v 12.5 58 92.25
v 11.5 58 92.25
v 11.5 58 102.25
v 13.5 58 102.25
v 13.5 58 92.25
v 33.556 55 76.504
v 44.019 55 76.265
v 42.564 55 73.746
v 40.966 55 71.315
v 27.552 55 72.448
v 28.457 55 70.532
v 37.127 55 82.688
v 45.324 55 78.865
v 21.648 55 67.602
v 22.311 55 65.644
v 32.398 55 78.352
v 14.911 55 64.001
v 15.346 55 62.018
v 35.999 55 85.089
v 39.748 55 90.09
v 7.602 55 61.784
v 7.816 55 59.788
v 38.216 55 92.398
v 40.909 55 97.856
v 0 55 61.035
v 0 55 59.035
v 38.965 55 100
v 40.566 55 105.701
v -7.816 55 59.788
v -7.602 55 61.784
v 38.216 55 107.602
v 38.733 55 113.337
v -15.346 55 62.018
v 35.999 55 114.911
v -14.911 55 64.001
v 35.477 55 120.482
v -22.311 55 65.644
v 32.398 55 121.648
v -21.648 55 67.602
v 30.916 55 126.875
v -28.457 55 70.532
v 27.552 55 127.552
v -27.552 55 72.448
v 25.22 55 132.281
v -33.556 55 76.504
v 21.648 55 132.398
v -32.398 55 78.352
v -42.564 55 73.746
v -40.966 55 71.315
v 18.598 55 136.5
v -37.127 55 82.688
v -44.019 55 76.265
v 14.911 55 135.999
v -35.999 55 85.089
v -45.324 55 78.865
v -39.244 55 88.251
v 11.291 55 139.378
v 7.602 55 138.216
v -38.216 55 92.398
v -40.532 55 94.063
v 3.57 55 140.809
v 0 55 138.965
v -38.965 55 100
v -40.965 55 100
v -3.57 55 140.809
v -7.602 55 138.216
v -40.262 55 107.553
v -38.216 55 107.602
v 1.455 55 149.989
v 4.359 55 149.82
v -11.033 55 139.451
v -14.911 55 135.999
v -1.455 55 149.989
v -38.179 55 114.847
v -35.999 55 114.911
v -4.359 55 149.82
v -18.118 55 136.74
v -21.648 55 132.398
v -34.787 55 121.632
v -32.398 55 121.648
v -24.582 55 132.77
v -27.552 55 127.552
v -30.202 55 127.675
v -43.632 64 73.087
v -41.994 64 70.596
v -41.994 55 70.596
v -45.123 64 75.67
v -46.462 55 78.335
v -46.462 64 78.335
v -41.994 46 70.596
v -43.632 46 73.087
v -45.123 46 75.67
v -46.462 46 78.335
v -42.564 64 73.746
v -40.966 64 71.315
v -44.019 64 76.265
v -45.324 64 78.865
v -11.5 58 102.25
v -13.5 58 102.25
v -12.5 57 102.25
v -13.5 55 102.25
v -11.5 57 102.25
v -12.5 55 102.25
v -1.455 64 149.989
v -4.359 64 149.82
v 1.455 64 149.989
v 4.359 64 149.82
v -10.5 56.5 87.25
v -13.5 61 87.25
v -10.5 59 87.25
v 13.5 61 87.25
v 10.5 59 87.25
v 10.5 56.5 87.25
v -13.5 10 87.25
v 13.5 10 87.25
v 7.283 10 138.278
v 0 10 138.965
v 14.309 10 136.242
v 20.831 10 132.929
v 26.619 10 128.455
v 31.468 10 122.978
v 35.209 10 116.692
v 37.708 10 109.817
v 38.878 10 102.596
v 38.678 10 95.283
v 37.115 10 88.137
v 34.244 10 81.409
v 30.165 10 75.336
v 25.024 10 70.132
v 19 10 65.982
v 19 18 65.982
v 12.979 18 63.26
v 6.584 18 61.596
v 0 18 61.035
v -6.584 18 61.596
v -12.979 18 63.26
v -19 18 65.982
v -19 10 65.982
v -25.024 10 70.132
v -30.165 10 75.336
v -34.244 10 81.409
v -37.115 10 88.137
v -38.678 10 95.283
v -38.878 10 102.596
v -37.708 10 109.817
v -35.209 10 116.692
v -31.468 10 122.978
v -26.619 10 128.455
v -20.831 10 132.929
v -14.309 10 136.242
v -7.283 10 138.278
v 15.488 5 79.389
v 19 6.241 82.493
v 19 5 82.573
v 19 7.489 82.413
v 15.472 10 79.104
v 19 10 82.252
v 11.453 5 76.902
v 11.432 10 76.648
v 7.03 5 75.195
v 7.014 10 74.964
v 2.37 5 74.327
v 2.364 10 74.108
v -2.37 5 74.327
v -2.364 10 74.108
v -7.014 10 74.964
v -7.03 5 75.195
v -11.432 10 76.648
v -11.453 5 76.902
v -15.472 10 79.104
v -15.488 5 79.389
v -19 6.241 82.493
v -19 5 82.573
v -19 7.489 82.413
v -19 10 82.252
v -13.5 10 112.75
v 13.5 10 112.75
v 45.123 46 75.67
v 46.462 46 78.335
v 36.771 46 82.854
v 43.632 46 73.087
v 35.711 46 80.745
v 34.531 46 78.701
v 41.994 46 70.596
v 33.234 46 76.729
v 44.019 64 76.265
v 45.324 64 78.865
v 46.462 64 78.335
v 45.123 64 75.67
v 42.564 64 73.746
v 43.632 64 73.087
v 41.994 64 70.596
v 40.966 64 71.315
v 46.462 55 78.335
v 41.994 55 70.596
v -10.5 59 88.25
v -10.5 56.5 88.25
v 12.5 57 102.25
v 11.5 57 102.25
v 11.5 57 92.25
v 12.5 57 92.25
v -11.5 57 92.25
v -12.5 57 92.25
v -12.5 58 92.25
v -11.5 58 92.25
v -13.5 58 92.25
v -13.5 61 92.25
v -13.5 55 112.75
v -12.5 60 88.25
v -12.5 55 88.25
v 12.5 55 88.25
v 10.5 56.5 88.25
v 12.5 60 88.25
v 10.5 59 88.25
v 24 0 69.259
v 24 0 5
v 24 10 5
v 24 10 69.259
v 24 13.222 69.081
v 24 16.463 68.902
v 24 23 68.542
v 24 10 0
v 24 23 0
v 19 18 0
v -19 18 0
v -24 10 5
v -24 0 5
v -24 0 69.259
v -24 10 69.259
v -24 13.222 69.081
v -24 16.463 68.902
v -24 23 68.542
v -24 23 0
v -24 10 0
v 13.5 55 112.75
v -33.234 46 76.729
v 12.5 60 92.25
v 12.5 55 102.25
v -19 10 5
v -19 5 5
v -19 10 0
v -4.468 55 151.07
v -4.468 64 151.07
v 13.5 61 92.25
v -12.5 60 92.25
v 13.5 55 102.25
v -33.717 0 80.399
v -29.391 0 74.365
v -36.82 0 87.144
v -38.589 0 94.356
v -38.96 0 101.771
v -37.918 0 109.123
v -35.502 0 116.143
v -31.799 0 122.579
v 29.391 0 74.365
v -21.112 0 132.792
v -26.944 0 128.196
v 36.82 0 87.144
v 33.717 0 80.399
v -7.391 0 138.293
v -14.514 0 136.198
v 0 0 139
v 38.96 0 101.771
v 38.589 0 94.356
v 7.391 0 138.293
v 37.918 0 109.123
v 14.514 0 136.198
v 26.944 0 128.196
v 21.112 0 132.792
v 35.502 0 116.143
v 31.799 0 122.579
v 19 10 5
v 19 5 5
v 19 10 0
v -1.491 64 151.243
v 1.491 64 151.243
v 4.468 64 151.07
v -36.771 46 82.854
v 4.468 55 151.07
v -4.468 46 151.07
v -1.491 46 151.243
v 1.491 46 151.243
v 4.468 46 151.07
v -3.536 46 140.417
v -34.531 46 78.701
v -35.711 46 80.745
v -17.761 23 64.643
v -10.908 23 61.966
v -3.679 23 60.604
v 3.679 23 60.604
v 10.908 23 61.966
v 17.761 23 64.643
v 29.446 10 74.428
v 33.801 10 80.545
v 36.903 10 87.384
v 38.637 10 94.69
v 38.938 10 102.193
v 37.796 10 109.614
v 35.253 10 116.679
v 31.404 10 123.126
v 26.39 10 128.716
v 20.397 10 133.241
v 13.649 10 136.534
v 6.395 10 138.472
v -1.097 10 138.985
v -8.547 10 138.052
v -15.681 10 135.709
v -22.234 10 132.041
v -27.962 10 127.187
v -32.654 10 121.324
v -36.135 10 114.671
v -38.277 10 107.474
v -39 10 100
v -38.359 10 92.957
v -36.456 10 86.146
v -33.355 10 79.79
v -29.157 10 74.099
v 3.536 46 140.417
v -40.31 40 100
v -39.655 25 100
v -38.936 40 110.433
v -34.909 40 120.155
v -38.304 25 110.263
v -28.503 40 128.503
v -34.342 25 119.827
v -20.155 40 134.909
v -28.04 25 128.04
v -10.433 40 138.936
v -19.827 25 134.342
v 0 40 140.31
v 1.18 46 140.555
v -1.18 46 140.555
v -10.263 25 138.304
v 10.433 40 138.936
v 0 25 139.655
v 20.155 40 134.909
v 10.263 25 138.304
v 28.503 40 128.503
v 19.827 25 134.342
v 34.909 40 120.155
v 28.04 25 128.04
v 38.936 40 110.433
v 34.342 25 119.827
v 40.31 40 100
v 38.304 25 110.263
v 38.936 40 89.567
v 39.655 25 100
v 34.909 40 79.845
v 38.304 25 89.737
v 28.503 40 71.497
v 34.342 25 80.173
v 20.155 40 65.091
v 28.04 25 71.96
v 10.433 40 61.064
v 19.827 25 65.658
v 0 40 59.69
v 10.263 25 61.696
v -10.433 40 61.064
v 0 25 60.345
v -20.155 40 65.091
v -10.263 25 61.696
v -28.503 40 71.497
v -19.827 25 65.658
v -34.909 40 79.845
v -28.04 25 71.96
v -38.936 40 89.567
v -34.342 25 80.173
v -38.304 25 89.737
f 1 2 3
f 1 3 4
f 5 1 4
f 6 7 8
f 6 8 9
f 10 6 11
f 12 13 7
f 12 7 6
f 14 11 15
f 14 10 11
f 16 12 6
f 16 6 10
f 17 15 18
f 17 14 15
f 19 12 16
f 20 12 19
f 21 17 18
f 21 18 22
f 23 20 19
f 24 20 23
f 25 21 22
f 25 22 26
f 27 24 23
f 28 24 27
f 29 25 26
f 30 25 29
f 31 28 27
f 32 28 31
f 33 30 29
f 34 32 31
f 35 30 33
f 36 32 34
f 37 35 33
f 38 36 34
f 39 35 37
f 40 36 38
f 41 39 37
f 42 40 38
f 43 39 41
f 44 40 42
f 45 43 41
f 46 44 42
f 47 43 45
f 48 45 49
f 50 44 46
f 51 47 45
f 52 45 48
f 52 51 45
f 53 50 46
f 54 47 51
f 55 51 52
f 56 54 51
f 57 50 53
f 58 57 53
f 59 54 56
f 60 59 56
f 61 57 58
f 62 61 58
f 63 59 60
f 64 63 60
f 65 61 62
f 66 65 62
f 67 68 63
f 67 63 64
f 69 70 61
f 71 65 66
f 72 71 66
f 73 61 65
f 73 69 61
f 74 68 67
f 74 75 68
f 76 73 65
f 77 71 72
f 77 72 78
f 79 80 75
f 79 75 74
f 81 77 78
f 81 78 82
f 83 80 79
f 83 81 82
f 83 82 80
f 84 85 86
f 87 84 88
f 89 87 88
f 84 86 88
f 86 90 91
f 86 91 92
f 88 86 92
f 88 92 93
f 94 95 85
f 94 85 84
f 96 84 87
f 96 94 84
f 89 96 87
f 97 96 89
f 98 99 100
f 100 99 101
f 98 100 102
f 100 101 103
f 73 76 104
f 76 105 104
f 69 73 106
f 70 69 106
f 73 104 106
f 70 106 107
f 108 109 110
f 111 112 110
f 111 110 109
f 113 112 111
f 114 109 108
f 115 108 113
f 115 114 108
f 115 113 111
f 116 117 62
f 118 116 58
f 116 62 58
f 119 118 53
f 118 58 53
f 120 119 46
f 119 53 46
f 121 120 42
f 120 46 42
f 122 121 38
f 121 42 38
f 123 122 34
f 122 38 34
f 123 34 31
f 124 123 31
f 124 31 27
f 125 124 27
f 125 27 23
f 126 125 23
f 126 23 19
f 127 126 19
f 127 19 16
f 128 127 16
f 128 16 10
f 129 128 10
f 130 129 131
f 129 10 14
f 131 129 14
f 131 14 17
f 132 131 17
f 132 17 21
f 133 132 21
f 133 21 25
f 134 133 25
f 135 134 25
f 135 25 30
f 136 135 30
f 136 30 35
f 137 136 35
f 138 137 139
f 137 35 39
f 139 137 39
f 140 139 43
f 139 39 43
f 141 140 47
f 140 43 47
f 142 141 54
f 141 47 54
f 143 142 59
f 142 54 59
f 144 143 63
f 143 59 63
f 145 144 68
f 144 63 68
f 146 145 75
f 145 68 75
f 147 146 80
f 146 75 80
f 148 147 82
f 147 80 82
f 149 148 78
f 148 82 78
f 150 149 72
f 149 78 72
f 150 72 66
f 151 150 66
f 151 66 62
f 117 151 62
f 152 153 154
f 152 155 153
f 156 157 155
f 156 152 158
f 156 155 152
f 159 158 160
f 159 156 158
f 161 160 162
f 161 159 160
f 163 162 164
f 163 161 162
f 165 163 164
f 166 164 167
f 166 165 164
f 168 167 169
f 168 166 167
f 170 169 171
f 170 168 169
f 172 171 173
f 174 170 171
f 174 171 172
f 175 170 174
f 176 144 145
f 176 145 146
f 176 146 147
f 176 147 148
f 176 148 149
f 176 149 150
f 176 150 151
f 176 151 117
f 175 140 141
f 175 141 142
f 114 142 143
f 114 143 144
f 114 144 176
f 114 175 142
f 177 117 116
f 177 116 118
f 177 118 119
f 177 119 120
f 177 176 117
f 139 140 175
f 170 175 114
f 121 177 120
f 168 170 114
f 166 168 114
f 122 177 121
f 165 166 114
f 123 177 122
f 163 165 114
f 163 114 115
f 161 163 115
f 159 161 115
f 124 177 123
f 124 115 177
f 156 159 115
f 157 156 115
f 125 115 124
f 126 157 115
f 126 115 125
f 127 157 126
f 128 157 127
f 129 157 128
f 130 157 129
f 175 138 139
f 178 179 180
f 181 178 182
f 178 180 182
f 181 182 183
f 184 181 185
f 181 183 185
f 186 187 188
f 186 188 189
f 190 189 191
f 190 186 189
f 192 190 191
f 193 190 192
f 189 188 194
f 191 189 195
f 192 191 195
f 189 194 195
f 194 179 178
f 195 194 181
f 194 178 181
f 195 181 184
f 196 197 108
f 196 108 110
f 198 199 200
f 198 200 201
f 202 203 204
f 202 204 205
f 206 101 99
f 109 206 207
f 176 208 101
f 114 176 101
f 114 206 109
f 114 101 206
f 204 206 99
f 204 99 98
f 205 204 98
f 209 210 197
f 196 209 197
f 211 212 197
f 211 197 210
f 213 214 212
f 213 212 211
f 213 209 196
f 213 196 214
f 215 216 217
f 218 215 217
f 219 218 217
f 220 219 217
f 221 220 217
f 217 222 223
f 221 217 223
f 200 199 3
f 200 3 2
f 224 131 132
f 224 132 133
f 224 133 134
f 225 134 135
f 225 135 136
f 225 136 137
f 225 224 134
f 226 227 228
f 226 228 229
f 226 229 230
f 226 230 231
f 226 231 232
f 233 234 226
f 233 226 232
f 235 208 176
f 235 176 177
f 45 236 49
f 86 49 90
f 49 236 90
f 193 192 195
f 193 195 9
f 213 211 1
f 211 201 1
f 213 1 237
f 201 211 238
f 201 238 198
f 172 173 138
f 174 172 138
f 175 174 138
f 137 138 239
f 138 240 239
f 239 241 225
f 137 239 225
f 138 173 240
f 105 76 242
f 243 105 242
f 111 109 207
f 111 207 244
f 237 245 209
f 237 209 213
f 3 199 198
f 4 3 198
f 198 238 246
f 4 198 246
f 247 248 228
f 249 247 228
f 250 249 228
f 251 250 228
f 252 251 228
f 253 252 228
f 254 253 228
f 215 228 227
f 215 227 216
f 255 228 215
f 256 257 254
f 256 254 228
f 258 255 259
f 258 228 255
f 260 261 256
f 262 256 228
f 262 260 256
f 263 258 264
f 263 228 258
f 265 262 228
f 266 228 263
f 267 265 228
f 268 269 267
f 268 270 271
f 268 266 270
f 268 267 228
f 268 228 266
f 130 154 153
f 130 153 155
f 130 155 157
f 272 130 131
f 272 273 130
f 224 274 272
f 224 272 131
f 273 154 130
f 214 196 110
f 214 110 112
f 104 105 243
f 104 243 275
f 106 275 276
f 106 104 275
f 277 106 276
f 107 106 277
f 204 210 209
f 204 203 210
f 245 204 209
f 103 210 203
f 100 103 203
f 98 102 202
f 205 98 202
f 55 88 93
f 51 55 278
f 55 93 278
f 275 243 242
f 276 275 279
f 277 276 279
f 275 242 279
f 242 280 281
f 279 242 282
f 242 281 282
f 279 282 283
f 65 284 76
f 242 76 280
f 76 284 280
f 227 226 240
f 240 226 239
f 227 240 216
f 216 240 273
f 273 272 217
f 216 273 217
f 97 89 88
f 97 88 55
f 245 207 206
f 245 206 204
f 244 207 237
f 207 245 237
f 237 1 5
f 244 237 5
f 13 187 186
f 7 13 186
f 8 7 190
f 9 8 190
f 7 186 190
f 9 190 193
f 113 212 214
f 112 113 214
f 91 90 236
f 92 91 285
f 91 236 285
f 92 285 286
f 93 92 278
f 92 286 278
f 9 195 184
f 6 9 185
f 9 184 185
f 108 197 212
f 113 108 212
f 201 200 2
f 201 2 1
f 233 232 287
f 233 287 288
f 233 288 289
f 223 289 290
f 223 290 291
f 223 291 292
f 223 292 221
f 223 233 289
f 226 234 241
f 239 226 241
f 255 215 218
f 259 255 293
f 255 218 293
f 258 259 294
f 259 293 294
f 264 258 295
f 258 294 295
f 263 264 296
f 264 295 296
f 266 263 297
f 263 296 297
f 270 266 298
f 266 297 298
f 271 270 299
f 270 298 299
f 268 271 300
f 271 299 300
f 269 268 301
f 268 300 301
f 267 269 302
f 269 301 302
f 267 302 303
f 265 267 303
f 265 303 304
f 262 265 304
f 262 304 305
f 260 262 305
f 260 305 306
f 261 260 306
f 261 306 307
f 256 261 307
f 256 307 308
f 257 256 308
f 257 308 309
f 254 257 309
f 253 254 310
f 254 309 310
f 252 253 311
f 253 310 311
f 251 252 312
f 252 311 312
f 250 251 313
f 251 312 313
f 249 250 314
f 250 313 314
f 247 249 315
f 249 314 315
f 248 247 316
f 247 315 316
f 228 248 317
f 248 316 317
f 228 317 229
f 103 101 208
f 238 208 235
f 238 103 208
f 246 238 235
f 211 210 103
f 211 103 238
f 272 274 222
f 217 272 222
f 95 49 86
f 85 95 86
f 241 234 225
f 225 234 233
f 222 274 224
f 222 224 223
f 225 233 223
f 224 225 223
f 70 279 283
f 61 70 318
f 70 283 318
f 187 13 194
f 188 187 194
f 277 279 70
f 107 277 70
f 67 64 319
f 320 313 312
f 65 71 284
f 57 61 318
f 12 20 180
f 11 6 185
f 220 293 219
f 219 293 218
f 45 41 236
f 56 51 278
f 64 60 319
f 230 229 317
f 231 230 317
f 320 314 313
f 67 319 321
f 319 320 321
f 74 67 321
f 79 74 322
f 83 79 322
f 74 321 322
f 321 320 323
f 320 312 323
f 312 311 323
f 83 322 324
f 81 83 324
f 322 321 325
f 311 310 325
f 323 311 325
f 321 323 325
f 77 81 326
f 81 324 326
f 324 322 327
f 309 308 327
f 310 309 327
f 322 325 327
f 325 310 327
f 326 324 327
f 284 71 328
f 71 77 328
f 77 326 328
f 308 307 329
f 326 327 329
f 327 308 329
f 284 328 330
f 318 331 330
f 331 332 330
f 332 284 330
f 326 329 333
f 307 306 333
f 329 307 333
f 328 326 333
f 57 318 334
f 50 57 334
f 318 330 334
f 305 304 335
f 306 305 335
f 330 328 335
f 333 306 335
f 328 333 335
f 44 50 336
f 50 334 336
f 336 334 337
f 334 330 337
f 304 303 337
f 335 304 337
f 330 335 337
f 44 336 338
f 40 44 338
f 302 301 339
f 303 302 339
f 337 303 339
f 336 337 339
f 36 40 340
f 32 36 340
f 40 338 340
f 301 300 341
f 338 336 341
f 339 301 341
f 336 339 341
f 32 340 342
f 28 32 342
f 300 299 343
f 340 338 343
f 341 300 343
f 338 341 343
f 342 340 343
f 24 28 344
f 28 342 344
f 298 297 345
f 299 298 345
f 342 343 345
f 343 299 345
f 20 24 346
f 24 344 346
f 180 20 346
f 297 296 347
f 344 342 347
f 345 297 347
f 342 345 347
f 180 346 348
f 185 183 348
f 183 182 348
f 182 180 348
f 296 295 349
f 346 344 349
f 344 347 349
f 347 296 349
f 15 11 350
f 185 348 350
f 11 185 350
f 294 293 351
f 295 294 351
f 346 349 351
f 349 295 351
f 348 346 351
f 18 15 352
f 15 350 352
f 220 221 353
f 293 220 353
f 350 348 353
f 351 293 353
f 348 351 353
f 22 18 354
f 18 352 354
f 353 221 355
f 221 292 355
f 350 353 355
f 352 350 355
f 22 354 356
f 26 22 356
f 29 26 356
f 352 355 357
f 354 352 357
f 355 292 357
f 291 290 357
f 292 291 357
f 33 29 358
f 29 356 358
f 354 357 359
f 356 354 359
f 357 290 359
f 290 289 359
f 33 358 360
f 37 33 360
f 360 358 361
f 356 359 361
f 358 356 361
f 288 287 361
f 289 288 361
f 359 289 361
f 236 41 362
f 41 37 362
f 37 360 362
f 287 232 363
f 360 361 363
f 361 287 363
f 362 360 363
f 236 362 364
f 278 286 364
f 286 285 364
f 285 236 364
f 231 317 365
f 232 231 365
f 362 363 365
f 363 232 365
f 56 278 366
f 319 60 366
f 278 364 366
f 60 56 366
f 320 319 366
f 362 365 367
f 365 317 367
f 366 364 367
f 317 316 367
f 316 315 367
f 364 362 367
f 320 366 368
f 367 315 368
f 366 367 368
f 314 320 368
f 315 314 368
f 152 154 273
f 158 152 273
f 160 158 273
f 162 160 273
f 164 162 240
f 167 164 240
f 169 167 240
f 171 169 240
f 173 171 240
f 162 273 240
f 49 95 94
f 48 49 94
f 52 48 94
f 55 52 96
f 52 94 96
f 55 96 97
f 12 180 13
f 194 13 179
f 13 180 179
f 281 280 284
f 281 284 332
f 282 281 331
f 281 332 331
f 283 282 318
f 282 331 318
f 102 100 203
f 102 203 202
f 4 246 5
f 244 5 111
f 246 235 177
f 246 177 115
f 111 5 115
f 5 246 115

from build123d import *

# Parameters (mm, degrees)
SKETCH1_W           = 48
SKETCH1_H           = 23
BOSS_EXTRUDE1_DEPTH = 100
SKETCH2_W           = 48
SKETCH2_H           = 10
CUT_EXTRUDE1_DEPTH  = 5
SKETCH3_R           = 39
BOSS_EXTRUDE2_DEPTH = 45
BOSS_EXTRUDE2_DRAFT = -2.5
SKETCH6_R           = 27.964742431
CUT_EXTRUDE3_DEPTH  = 55
CUT_EXTRUDE3_DRAFT  = -2.5
SKETCH9_R           = 39
BOSS_EXTRUDE4_DEPTH = 10
CUT_EXTRUDE5_REACH  = 158.762
SKETCH11_W          = 38
SKETCH11_H          = 13
SKETCH12_R          = 1.5
BOSS_EXTRUDE5_DEPTH = 2
REVOLVE1_START      = 46
REVOLVE1_DEPTH      = 9
REVOLVE1_START_2    = 55
REVOLVE1_2_DEPTH    = 9
CIRPATTERN1_COUNT   = 3
SKETCH15_R          = 50.01
CUT_EXTRUDE6_DEPTH  = 75
CUT_EXTRUDE8_REACH  = 169.525
SKETCH17_R          = 38.964742431
SKETCH18_W          = 27
SKETCH18_H          = 25.5
BOSS_EXTRUDE6_DEPTH = 45
SKETCH19_W          = 27
SKETCH19_H          = 5
BOSS_EXTRUDE7_DEPTH = 6
SKETCH20_W          = 25
SKETCH20_H          = 5
CUT_EXTRUDE9_DEPTH  = 4
SKETCH21_W          = 21
SKETCH21_H          = 2.5
CUT_EXTRUDE10_DEPTH = 119.502093026
SKETCH22_W          = 2
SKETCH22_H          = 10
BOSS_EXTRUDE8_DEPTH = 3
SKETCH23_W          = 1
SKETCH23_H          = 2
CUT_EXTRUDE11_DEPTH = 14


# Read off the part's stored shape, not the designer's step: Revolve1
with BuildPart() as part:
    # Sketch1 → Boss-Extrude1 (new body)
    with BuildSketch(Plane.XY):
        with Locations((0, 11.5)):
            Rectangle(SKETCH1_W, SKETCH1_H)
    extrude(amount=BOSS_EXTRUDE1_DEPTH)

    # Sketch2 → Cut-Extrude1 (cut)
    with BuildSketch(Plane.XY):
        with Locations((0, 5)):
            Rectangle(SKETCH2_W, SKETCH2_H)
    extrude(amount=CUT_EXTRUDE1_DEPTH, mode=Mode.SUBTRACT)


with BuildPart() as boss_extrude2_tool:
    # Sketch3 → Boss-Extrude2 (with draft: the straight prism first)
    with BuildSketch(Plane(origin=(0, 10, 0), x_dir=(-1, 0, 0), z_dir=(0, 1, 0))):
        with Locations((0, 100)):
            Circle(SKETCH3_R)
    extrude(amount=BOSS_EXTRUDE2_DEPTH)
    # Boss-Extrude2: the draft: its side faces are tilted about the plane it starts from
    boss_extrude2_sides = [boss_extrude2_tool.faces().sort_by_distance(p)[0] for p in [
        (39, 32.5, 100),
    ]]
    draft(boss_extrude2_sides, Plane(origin=(0, 10, 0), x_dir=(-1, 0, 0), z_dir=(0, 1, 0)), BOSS_EXTRUDE2_DRAFT)


with BuildPart() as part_1:
    add(part.part)

    # Boss-Extrude2: add boss_extrude2_tool
    add(boss_extrude2_tool.part)


with BuildPart() as cut_extrude3_tool:
    # Sketch6 → Cut-Extrude3 (with draft: the straight prism first)
    with BuildSketch(Plane(origin=(0, 55, 0), x_dir=(1, 0, 0), z_dir=(0, 1, 0))):
        with Locations((0, -100)):
            Circle(SKETCH6_R)
    extrude(amount=-CUT_EXTRUDE3_DEPTH)
    # Cut-Extrude3: the draft: its side faces are tilted about the plane it starts from
    cut_extrude3_sides = [cut_extrude3_tool.faces().sort_by_distance(p)[0] for p in [
        (-27.964742431, 27.5, 100),
    ]]
    draft(cut_extrude3_sides, Plane(origin=(0, 55, 0), x_dir=(1, 0, 0), z_dir=(0, 1, 0)), CUT_EXTRUDE3_DRAFT)


with BuildPart() as part_2:
    add(part_1.part)

    # Cut-Extrude3: cut by cut_extrude3_tool
    add(cut_extrude3_tool.part, mode=Mode.SUBTRACT)

    # Sketch9 → Boss-Extrude4 (add)
    with BuildSketch(Plane.XZ.offset(-10)):
        with Locations((0, 100)):
            Circle(SKETCH9_R)
    extrude(amount=BOSS_EXTRUDE4_DEPTH)

    # Cut-Extrude5: up to this cone (the profile starts outside it)
    cut_extrude5_end = Plane(origin=(0, 11.5, 100), z_dir=(0, 1, 0)) * Cone(17.973918392, 34.157064436, 370.654982829, mode=Mode.PRIVATE)
    # Sketch11 → Cut-Extrude5 (cut, up to the surface)
    with BuildSketch(Plane(origin=(0, 0, 0), x_dir=(-1, 0, 0), z_dir=(0, 0, -1)), mode=Mode.PRIVATE) as cut_extrude5_sk1:
        with Locations((0, 11.5)):
            Rectangle(SKETCH11_W, SKETCH11_H)
    cut_extrude5_tool1 = extrude(cut_extrude5_sk1.sketch, amount=-CUT_EXTRUDE5_REACH, mode=Mode.PRIVATE) - cut_extrude5_end
    add(cut_extrude5_tool1.solids().sort_by_distance((0, 11.5, 0))[0], mode=Mode.SUBTRACT)

    # Sketch12 → Boss-Extrude5 (add)
    with BuildSketch(Plane(origin=(0, 55, 0), x_dir=(1, 0, 0), z_dir=(0, 1, 0))):
        with Locations(Location((32, -100, 0), (0, 0, 90))):
            Circle(SKETCH12_R)
        with Locations(Location((-32, -100, 0), (0, 0, 270))):
            Circle(SKETCH12_R)
    extrude(amount=BOSS_EXTRUDE5_DEPTH)

    # Revolve1 outline → Revolve1 (add)
    with BuildSketch(Plane(origin=(0, 0, 0), x_dir=(1, 0, 0), z_dir=(0, 1, 0)).offset(REVOLVE1_START)):
        with BuildLine():
            Line((-3.536064836, -140.41740602), (-4.468016703, -151.069664609))
            ThreePointArc((-4.468016703, -151.069664609), (0, -151.264742431), (4.468016703, -151.069664609))
            Line((4.468016703, -151.069664609), (3.536064836, -140.41740602))
            Line((3.536064836, -140.41740602), (3.499546541, -140))
            Line((3.499546541, -140), (-3.499546541, -140))
            Line((-3.499546541, -140), (-3.536064836, -140.41740602))
        make_face()
    revolve1 = extrude(amount=REVOLVE1_DEPTH)

    # Revolve1 2 outline → Revolve1 2 (add)
    with BuildSketch(Plane(origin=(0, 0, 0), x_dir=(1, 0, 0), z_dir=(0, 1, 0)).offset(REVOLVE1_START_2)):
        with BuildLine():
            ThreePointArc((4.293705218, -149.077275213), (0, -149.264742431), (-4.293705218, -149.077275213))
            Line((-4.293705218, -149.077275213), (-4.468016703, -151.069664609))
            ThreePointArc((-4.468016703, -151.069664609), (0, -151.264742431), (4.468016703, -151.069664609))
            Line((4.468016703, -151.069664609), (4.293705218, -149.077275213))
        make_face()
    revolve1_2 = extrude(amount=REVOLVE1_2_DEPTH)

    # CirPattern1: Revolve1, Revolve1 2 ×3 about axis
    cirpattern1_axis = Axis((0, 0, 100), (0, 1, 0))
    add([revolve1.rotate(cirpattern1_axis, i * 360 / CIRPATTERN1_COUNT) for i in range(1, CIRPATTERN1_COUNT)])
    add([revolve1_2.rotate(cirpattern1_axis, i * 360 / CIRPATTERN1_COUNT) for i in range(1, CIRPATTERN1_COUNT)])

    # Sketch15 → Cut-Extrude6 (cut)
    with BuildSketch(Plane(origin=(0, 130, 0), x_dir=(1, 0, 0), z_dir=(0, 1, 0))):
        with Locations((0, -100)):
            Circle(SKETCH15_R)
    extrude(amount=-CUT_EXTRUDE6_DEPTH, mode=Mode.SUBTRACT)

    # Cut-Extrude8: up to this face of the body (flat: up to its plane)
    cut_extrude8_end = Plane(part_2.part.faces().sort_by_distance((0, 10, 100))[0])
    # Sketch17 → Cut-Extrude8 (cut, up to the picked face)
    with BuildSketch(Plane(origin=(0, 55, 0), x_dir=(1, 0, 0), z_dir=(0, 1, 0)), mode=Mode.PRIVATE) as cut_extrude8_sk1:
        with Locations(Location((0, -100, 0), (0, 0, 270))):
            Circle(SKETCH17_R)
    cut_extrude8_tool1 = split(extrude(cut_extrude8_sk1.sketch, amount=-CUT_EXTRUDE8_REACH, mode=Mode.PRIVATE), bisect_by=cut_extrude8_end, keep=Keep.BOTH, mode=Mode.PRIVATE)
    add(cut_extrude8_tool1.solids().sort_by(Axis((0, 55, 100), (0, -1, 0)))[0], mode=Mode.SUBTRACT)

    # Sketch18 → Boss-Extrude6 (add)
    with BuildSketch(Plane(origin=(0, 10, 0), x_dir=(1, 0, 0), z_dir=(0, 1, 0))):
        with Locations((0, -100)):
            Rectangle(SKETCH18_W, SKETCH18_H)
    extrude(amount=BOSS_EXTRUDE6_DEPTH)

    # Sketch19 → Boss-Extrude7 (add)
    with BuildSketch(Plane(origin=(0, 55, 0), x_dir=(1, 0, 0), z_dir=(0, 1, 0))):
        with Locations((0, -89.75)):
            Rectangle(SKETCH19_W, SKETCH19_H)
    extrude(amount=BOSS_EXTRUDE7_DEPTH)

    # Sketch20 → Cut-Extrude9 (cut)
    with BuildSketch(Plane.XY.offset(92.25)):
        with Locations((0, 57.5)):
            Rectangle(SKETCH20_W, SKETCH20_H)
    extrude(amount=-CUT_EXTRUDE9_DEPTH, mode=Mode.SUBTRACT)

    # Sketch21 → Cut-Extrude10 (cut, through all)
    with BuildSketch(Plane.XY.offset(88.25)):
        with Locations((0, 57.75)):
            Rectangle(SKETCH21_W, SKETCH21_H)
    extrude(amount=-CUT_EXTRUDE10_DEPTH, mode=Mode.SUBTRACT)

    # Sketch22 → Boss-Extrude8 (add)
    with BuildSketch(Plane(origin=(0, 55, 0), x_dir=(1, 0, 0), z_dir=(0, 1, 0))):
        with Locations((-12.5, -97.25)):
            Rectangle(SKETCH22_W, SKETCH22_H)
        with Locations((12.5, -97.25)):
            Rectangle(SKETCH22_W, SKETCH22_H)
    extrude(amount=BOSS_EXTRUDE8_DEPTH)

    # Sketch23 → Cut-Extrude11 (cut)
    with BuildSketch(Plane.XY.offset(102.25)):
        with Locations((12, 56)):
            Rectangle(SKETCH23_W, SKETCH23_H)
        with Locations((-12, 56)):
            Rectangle(SKETCH23_W, SKETCH23_H)
    extrude(amount=-CUT_EXTRUDE11_DEPTH, mode=Mode.SUBTRACT)


solid = part_2.part
